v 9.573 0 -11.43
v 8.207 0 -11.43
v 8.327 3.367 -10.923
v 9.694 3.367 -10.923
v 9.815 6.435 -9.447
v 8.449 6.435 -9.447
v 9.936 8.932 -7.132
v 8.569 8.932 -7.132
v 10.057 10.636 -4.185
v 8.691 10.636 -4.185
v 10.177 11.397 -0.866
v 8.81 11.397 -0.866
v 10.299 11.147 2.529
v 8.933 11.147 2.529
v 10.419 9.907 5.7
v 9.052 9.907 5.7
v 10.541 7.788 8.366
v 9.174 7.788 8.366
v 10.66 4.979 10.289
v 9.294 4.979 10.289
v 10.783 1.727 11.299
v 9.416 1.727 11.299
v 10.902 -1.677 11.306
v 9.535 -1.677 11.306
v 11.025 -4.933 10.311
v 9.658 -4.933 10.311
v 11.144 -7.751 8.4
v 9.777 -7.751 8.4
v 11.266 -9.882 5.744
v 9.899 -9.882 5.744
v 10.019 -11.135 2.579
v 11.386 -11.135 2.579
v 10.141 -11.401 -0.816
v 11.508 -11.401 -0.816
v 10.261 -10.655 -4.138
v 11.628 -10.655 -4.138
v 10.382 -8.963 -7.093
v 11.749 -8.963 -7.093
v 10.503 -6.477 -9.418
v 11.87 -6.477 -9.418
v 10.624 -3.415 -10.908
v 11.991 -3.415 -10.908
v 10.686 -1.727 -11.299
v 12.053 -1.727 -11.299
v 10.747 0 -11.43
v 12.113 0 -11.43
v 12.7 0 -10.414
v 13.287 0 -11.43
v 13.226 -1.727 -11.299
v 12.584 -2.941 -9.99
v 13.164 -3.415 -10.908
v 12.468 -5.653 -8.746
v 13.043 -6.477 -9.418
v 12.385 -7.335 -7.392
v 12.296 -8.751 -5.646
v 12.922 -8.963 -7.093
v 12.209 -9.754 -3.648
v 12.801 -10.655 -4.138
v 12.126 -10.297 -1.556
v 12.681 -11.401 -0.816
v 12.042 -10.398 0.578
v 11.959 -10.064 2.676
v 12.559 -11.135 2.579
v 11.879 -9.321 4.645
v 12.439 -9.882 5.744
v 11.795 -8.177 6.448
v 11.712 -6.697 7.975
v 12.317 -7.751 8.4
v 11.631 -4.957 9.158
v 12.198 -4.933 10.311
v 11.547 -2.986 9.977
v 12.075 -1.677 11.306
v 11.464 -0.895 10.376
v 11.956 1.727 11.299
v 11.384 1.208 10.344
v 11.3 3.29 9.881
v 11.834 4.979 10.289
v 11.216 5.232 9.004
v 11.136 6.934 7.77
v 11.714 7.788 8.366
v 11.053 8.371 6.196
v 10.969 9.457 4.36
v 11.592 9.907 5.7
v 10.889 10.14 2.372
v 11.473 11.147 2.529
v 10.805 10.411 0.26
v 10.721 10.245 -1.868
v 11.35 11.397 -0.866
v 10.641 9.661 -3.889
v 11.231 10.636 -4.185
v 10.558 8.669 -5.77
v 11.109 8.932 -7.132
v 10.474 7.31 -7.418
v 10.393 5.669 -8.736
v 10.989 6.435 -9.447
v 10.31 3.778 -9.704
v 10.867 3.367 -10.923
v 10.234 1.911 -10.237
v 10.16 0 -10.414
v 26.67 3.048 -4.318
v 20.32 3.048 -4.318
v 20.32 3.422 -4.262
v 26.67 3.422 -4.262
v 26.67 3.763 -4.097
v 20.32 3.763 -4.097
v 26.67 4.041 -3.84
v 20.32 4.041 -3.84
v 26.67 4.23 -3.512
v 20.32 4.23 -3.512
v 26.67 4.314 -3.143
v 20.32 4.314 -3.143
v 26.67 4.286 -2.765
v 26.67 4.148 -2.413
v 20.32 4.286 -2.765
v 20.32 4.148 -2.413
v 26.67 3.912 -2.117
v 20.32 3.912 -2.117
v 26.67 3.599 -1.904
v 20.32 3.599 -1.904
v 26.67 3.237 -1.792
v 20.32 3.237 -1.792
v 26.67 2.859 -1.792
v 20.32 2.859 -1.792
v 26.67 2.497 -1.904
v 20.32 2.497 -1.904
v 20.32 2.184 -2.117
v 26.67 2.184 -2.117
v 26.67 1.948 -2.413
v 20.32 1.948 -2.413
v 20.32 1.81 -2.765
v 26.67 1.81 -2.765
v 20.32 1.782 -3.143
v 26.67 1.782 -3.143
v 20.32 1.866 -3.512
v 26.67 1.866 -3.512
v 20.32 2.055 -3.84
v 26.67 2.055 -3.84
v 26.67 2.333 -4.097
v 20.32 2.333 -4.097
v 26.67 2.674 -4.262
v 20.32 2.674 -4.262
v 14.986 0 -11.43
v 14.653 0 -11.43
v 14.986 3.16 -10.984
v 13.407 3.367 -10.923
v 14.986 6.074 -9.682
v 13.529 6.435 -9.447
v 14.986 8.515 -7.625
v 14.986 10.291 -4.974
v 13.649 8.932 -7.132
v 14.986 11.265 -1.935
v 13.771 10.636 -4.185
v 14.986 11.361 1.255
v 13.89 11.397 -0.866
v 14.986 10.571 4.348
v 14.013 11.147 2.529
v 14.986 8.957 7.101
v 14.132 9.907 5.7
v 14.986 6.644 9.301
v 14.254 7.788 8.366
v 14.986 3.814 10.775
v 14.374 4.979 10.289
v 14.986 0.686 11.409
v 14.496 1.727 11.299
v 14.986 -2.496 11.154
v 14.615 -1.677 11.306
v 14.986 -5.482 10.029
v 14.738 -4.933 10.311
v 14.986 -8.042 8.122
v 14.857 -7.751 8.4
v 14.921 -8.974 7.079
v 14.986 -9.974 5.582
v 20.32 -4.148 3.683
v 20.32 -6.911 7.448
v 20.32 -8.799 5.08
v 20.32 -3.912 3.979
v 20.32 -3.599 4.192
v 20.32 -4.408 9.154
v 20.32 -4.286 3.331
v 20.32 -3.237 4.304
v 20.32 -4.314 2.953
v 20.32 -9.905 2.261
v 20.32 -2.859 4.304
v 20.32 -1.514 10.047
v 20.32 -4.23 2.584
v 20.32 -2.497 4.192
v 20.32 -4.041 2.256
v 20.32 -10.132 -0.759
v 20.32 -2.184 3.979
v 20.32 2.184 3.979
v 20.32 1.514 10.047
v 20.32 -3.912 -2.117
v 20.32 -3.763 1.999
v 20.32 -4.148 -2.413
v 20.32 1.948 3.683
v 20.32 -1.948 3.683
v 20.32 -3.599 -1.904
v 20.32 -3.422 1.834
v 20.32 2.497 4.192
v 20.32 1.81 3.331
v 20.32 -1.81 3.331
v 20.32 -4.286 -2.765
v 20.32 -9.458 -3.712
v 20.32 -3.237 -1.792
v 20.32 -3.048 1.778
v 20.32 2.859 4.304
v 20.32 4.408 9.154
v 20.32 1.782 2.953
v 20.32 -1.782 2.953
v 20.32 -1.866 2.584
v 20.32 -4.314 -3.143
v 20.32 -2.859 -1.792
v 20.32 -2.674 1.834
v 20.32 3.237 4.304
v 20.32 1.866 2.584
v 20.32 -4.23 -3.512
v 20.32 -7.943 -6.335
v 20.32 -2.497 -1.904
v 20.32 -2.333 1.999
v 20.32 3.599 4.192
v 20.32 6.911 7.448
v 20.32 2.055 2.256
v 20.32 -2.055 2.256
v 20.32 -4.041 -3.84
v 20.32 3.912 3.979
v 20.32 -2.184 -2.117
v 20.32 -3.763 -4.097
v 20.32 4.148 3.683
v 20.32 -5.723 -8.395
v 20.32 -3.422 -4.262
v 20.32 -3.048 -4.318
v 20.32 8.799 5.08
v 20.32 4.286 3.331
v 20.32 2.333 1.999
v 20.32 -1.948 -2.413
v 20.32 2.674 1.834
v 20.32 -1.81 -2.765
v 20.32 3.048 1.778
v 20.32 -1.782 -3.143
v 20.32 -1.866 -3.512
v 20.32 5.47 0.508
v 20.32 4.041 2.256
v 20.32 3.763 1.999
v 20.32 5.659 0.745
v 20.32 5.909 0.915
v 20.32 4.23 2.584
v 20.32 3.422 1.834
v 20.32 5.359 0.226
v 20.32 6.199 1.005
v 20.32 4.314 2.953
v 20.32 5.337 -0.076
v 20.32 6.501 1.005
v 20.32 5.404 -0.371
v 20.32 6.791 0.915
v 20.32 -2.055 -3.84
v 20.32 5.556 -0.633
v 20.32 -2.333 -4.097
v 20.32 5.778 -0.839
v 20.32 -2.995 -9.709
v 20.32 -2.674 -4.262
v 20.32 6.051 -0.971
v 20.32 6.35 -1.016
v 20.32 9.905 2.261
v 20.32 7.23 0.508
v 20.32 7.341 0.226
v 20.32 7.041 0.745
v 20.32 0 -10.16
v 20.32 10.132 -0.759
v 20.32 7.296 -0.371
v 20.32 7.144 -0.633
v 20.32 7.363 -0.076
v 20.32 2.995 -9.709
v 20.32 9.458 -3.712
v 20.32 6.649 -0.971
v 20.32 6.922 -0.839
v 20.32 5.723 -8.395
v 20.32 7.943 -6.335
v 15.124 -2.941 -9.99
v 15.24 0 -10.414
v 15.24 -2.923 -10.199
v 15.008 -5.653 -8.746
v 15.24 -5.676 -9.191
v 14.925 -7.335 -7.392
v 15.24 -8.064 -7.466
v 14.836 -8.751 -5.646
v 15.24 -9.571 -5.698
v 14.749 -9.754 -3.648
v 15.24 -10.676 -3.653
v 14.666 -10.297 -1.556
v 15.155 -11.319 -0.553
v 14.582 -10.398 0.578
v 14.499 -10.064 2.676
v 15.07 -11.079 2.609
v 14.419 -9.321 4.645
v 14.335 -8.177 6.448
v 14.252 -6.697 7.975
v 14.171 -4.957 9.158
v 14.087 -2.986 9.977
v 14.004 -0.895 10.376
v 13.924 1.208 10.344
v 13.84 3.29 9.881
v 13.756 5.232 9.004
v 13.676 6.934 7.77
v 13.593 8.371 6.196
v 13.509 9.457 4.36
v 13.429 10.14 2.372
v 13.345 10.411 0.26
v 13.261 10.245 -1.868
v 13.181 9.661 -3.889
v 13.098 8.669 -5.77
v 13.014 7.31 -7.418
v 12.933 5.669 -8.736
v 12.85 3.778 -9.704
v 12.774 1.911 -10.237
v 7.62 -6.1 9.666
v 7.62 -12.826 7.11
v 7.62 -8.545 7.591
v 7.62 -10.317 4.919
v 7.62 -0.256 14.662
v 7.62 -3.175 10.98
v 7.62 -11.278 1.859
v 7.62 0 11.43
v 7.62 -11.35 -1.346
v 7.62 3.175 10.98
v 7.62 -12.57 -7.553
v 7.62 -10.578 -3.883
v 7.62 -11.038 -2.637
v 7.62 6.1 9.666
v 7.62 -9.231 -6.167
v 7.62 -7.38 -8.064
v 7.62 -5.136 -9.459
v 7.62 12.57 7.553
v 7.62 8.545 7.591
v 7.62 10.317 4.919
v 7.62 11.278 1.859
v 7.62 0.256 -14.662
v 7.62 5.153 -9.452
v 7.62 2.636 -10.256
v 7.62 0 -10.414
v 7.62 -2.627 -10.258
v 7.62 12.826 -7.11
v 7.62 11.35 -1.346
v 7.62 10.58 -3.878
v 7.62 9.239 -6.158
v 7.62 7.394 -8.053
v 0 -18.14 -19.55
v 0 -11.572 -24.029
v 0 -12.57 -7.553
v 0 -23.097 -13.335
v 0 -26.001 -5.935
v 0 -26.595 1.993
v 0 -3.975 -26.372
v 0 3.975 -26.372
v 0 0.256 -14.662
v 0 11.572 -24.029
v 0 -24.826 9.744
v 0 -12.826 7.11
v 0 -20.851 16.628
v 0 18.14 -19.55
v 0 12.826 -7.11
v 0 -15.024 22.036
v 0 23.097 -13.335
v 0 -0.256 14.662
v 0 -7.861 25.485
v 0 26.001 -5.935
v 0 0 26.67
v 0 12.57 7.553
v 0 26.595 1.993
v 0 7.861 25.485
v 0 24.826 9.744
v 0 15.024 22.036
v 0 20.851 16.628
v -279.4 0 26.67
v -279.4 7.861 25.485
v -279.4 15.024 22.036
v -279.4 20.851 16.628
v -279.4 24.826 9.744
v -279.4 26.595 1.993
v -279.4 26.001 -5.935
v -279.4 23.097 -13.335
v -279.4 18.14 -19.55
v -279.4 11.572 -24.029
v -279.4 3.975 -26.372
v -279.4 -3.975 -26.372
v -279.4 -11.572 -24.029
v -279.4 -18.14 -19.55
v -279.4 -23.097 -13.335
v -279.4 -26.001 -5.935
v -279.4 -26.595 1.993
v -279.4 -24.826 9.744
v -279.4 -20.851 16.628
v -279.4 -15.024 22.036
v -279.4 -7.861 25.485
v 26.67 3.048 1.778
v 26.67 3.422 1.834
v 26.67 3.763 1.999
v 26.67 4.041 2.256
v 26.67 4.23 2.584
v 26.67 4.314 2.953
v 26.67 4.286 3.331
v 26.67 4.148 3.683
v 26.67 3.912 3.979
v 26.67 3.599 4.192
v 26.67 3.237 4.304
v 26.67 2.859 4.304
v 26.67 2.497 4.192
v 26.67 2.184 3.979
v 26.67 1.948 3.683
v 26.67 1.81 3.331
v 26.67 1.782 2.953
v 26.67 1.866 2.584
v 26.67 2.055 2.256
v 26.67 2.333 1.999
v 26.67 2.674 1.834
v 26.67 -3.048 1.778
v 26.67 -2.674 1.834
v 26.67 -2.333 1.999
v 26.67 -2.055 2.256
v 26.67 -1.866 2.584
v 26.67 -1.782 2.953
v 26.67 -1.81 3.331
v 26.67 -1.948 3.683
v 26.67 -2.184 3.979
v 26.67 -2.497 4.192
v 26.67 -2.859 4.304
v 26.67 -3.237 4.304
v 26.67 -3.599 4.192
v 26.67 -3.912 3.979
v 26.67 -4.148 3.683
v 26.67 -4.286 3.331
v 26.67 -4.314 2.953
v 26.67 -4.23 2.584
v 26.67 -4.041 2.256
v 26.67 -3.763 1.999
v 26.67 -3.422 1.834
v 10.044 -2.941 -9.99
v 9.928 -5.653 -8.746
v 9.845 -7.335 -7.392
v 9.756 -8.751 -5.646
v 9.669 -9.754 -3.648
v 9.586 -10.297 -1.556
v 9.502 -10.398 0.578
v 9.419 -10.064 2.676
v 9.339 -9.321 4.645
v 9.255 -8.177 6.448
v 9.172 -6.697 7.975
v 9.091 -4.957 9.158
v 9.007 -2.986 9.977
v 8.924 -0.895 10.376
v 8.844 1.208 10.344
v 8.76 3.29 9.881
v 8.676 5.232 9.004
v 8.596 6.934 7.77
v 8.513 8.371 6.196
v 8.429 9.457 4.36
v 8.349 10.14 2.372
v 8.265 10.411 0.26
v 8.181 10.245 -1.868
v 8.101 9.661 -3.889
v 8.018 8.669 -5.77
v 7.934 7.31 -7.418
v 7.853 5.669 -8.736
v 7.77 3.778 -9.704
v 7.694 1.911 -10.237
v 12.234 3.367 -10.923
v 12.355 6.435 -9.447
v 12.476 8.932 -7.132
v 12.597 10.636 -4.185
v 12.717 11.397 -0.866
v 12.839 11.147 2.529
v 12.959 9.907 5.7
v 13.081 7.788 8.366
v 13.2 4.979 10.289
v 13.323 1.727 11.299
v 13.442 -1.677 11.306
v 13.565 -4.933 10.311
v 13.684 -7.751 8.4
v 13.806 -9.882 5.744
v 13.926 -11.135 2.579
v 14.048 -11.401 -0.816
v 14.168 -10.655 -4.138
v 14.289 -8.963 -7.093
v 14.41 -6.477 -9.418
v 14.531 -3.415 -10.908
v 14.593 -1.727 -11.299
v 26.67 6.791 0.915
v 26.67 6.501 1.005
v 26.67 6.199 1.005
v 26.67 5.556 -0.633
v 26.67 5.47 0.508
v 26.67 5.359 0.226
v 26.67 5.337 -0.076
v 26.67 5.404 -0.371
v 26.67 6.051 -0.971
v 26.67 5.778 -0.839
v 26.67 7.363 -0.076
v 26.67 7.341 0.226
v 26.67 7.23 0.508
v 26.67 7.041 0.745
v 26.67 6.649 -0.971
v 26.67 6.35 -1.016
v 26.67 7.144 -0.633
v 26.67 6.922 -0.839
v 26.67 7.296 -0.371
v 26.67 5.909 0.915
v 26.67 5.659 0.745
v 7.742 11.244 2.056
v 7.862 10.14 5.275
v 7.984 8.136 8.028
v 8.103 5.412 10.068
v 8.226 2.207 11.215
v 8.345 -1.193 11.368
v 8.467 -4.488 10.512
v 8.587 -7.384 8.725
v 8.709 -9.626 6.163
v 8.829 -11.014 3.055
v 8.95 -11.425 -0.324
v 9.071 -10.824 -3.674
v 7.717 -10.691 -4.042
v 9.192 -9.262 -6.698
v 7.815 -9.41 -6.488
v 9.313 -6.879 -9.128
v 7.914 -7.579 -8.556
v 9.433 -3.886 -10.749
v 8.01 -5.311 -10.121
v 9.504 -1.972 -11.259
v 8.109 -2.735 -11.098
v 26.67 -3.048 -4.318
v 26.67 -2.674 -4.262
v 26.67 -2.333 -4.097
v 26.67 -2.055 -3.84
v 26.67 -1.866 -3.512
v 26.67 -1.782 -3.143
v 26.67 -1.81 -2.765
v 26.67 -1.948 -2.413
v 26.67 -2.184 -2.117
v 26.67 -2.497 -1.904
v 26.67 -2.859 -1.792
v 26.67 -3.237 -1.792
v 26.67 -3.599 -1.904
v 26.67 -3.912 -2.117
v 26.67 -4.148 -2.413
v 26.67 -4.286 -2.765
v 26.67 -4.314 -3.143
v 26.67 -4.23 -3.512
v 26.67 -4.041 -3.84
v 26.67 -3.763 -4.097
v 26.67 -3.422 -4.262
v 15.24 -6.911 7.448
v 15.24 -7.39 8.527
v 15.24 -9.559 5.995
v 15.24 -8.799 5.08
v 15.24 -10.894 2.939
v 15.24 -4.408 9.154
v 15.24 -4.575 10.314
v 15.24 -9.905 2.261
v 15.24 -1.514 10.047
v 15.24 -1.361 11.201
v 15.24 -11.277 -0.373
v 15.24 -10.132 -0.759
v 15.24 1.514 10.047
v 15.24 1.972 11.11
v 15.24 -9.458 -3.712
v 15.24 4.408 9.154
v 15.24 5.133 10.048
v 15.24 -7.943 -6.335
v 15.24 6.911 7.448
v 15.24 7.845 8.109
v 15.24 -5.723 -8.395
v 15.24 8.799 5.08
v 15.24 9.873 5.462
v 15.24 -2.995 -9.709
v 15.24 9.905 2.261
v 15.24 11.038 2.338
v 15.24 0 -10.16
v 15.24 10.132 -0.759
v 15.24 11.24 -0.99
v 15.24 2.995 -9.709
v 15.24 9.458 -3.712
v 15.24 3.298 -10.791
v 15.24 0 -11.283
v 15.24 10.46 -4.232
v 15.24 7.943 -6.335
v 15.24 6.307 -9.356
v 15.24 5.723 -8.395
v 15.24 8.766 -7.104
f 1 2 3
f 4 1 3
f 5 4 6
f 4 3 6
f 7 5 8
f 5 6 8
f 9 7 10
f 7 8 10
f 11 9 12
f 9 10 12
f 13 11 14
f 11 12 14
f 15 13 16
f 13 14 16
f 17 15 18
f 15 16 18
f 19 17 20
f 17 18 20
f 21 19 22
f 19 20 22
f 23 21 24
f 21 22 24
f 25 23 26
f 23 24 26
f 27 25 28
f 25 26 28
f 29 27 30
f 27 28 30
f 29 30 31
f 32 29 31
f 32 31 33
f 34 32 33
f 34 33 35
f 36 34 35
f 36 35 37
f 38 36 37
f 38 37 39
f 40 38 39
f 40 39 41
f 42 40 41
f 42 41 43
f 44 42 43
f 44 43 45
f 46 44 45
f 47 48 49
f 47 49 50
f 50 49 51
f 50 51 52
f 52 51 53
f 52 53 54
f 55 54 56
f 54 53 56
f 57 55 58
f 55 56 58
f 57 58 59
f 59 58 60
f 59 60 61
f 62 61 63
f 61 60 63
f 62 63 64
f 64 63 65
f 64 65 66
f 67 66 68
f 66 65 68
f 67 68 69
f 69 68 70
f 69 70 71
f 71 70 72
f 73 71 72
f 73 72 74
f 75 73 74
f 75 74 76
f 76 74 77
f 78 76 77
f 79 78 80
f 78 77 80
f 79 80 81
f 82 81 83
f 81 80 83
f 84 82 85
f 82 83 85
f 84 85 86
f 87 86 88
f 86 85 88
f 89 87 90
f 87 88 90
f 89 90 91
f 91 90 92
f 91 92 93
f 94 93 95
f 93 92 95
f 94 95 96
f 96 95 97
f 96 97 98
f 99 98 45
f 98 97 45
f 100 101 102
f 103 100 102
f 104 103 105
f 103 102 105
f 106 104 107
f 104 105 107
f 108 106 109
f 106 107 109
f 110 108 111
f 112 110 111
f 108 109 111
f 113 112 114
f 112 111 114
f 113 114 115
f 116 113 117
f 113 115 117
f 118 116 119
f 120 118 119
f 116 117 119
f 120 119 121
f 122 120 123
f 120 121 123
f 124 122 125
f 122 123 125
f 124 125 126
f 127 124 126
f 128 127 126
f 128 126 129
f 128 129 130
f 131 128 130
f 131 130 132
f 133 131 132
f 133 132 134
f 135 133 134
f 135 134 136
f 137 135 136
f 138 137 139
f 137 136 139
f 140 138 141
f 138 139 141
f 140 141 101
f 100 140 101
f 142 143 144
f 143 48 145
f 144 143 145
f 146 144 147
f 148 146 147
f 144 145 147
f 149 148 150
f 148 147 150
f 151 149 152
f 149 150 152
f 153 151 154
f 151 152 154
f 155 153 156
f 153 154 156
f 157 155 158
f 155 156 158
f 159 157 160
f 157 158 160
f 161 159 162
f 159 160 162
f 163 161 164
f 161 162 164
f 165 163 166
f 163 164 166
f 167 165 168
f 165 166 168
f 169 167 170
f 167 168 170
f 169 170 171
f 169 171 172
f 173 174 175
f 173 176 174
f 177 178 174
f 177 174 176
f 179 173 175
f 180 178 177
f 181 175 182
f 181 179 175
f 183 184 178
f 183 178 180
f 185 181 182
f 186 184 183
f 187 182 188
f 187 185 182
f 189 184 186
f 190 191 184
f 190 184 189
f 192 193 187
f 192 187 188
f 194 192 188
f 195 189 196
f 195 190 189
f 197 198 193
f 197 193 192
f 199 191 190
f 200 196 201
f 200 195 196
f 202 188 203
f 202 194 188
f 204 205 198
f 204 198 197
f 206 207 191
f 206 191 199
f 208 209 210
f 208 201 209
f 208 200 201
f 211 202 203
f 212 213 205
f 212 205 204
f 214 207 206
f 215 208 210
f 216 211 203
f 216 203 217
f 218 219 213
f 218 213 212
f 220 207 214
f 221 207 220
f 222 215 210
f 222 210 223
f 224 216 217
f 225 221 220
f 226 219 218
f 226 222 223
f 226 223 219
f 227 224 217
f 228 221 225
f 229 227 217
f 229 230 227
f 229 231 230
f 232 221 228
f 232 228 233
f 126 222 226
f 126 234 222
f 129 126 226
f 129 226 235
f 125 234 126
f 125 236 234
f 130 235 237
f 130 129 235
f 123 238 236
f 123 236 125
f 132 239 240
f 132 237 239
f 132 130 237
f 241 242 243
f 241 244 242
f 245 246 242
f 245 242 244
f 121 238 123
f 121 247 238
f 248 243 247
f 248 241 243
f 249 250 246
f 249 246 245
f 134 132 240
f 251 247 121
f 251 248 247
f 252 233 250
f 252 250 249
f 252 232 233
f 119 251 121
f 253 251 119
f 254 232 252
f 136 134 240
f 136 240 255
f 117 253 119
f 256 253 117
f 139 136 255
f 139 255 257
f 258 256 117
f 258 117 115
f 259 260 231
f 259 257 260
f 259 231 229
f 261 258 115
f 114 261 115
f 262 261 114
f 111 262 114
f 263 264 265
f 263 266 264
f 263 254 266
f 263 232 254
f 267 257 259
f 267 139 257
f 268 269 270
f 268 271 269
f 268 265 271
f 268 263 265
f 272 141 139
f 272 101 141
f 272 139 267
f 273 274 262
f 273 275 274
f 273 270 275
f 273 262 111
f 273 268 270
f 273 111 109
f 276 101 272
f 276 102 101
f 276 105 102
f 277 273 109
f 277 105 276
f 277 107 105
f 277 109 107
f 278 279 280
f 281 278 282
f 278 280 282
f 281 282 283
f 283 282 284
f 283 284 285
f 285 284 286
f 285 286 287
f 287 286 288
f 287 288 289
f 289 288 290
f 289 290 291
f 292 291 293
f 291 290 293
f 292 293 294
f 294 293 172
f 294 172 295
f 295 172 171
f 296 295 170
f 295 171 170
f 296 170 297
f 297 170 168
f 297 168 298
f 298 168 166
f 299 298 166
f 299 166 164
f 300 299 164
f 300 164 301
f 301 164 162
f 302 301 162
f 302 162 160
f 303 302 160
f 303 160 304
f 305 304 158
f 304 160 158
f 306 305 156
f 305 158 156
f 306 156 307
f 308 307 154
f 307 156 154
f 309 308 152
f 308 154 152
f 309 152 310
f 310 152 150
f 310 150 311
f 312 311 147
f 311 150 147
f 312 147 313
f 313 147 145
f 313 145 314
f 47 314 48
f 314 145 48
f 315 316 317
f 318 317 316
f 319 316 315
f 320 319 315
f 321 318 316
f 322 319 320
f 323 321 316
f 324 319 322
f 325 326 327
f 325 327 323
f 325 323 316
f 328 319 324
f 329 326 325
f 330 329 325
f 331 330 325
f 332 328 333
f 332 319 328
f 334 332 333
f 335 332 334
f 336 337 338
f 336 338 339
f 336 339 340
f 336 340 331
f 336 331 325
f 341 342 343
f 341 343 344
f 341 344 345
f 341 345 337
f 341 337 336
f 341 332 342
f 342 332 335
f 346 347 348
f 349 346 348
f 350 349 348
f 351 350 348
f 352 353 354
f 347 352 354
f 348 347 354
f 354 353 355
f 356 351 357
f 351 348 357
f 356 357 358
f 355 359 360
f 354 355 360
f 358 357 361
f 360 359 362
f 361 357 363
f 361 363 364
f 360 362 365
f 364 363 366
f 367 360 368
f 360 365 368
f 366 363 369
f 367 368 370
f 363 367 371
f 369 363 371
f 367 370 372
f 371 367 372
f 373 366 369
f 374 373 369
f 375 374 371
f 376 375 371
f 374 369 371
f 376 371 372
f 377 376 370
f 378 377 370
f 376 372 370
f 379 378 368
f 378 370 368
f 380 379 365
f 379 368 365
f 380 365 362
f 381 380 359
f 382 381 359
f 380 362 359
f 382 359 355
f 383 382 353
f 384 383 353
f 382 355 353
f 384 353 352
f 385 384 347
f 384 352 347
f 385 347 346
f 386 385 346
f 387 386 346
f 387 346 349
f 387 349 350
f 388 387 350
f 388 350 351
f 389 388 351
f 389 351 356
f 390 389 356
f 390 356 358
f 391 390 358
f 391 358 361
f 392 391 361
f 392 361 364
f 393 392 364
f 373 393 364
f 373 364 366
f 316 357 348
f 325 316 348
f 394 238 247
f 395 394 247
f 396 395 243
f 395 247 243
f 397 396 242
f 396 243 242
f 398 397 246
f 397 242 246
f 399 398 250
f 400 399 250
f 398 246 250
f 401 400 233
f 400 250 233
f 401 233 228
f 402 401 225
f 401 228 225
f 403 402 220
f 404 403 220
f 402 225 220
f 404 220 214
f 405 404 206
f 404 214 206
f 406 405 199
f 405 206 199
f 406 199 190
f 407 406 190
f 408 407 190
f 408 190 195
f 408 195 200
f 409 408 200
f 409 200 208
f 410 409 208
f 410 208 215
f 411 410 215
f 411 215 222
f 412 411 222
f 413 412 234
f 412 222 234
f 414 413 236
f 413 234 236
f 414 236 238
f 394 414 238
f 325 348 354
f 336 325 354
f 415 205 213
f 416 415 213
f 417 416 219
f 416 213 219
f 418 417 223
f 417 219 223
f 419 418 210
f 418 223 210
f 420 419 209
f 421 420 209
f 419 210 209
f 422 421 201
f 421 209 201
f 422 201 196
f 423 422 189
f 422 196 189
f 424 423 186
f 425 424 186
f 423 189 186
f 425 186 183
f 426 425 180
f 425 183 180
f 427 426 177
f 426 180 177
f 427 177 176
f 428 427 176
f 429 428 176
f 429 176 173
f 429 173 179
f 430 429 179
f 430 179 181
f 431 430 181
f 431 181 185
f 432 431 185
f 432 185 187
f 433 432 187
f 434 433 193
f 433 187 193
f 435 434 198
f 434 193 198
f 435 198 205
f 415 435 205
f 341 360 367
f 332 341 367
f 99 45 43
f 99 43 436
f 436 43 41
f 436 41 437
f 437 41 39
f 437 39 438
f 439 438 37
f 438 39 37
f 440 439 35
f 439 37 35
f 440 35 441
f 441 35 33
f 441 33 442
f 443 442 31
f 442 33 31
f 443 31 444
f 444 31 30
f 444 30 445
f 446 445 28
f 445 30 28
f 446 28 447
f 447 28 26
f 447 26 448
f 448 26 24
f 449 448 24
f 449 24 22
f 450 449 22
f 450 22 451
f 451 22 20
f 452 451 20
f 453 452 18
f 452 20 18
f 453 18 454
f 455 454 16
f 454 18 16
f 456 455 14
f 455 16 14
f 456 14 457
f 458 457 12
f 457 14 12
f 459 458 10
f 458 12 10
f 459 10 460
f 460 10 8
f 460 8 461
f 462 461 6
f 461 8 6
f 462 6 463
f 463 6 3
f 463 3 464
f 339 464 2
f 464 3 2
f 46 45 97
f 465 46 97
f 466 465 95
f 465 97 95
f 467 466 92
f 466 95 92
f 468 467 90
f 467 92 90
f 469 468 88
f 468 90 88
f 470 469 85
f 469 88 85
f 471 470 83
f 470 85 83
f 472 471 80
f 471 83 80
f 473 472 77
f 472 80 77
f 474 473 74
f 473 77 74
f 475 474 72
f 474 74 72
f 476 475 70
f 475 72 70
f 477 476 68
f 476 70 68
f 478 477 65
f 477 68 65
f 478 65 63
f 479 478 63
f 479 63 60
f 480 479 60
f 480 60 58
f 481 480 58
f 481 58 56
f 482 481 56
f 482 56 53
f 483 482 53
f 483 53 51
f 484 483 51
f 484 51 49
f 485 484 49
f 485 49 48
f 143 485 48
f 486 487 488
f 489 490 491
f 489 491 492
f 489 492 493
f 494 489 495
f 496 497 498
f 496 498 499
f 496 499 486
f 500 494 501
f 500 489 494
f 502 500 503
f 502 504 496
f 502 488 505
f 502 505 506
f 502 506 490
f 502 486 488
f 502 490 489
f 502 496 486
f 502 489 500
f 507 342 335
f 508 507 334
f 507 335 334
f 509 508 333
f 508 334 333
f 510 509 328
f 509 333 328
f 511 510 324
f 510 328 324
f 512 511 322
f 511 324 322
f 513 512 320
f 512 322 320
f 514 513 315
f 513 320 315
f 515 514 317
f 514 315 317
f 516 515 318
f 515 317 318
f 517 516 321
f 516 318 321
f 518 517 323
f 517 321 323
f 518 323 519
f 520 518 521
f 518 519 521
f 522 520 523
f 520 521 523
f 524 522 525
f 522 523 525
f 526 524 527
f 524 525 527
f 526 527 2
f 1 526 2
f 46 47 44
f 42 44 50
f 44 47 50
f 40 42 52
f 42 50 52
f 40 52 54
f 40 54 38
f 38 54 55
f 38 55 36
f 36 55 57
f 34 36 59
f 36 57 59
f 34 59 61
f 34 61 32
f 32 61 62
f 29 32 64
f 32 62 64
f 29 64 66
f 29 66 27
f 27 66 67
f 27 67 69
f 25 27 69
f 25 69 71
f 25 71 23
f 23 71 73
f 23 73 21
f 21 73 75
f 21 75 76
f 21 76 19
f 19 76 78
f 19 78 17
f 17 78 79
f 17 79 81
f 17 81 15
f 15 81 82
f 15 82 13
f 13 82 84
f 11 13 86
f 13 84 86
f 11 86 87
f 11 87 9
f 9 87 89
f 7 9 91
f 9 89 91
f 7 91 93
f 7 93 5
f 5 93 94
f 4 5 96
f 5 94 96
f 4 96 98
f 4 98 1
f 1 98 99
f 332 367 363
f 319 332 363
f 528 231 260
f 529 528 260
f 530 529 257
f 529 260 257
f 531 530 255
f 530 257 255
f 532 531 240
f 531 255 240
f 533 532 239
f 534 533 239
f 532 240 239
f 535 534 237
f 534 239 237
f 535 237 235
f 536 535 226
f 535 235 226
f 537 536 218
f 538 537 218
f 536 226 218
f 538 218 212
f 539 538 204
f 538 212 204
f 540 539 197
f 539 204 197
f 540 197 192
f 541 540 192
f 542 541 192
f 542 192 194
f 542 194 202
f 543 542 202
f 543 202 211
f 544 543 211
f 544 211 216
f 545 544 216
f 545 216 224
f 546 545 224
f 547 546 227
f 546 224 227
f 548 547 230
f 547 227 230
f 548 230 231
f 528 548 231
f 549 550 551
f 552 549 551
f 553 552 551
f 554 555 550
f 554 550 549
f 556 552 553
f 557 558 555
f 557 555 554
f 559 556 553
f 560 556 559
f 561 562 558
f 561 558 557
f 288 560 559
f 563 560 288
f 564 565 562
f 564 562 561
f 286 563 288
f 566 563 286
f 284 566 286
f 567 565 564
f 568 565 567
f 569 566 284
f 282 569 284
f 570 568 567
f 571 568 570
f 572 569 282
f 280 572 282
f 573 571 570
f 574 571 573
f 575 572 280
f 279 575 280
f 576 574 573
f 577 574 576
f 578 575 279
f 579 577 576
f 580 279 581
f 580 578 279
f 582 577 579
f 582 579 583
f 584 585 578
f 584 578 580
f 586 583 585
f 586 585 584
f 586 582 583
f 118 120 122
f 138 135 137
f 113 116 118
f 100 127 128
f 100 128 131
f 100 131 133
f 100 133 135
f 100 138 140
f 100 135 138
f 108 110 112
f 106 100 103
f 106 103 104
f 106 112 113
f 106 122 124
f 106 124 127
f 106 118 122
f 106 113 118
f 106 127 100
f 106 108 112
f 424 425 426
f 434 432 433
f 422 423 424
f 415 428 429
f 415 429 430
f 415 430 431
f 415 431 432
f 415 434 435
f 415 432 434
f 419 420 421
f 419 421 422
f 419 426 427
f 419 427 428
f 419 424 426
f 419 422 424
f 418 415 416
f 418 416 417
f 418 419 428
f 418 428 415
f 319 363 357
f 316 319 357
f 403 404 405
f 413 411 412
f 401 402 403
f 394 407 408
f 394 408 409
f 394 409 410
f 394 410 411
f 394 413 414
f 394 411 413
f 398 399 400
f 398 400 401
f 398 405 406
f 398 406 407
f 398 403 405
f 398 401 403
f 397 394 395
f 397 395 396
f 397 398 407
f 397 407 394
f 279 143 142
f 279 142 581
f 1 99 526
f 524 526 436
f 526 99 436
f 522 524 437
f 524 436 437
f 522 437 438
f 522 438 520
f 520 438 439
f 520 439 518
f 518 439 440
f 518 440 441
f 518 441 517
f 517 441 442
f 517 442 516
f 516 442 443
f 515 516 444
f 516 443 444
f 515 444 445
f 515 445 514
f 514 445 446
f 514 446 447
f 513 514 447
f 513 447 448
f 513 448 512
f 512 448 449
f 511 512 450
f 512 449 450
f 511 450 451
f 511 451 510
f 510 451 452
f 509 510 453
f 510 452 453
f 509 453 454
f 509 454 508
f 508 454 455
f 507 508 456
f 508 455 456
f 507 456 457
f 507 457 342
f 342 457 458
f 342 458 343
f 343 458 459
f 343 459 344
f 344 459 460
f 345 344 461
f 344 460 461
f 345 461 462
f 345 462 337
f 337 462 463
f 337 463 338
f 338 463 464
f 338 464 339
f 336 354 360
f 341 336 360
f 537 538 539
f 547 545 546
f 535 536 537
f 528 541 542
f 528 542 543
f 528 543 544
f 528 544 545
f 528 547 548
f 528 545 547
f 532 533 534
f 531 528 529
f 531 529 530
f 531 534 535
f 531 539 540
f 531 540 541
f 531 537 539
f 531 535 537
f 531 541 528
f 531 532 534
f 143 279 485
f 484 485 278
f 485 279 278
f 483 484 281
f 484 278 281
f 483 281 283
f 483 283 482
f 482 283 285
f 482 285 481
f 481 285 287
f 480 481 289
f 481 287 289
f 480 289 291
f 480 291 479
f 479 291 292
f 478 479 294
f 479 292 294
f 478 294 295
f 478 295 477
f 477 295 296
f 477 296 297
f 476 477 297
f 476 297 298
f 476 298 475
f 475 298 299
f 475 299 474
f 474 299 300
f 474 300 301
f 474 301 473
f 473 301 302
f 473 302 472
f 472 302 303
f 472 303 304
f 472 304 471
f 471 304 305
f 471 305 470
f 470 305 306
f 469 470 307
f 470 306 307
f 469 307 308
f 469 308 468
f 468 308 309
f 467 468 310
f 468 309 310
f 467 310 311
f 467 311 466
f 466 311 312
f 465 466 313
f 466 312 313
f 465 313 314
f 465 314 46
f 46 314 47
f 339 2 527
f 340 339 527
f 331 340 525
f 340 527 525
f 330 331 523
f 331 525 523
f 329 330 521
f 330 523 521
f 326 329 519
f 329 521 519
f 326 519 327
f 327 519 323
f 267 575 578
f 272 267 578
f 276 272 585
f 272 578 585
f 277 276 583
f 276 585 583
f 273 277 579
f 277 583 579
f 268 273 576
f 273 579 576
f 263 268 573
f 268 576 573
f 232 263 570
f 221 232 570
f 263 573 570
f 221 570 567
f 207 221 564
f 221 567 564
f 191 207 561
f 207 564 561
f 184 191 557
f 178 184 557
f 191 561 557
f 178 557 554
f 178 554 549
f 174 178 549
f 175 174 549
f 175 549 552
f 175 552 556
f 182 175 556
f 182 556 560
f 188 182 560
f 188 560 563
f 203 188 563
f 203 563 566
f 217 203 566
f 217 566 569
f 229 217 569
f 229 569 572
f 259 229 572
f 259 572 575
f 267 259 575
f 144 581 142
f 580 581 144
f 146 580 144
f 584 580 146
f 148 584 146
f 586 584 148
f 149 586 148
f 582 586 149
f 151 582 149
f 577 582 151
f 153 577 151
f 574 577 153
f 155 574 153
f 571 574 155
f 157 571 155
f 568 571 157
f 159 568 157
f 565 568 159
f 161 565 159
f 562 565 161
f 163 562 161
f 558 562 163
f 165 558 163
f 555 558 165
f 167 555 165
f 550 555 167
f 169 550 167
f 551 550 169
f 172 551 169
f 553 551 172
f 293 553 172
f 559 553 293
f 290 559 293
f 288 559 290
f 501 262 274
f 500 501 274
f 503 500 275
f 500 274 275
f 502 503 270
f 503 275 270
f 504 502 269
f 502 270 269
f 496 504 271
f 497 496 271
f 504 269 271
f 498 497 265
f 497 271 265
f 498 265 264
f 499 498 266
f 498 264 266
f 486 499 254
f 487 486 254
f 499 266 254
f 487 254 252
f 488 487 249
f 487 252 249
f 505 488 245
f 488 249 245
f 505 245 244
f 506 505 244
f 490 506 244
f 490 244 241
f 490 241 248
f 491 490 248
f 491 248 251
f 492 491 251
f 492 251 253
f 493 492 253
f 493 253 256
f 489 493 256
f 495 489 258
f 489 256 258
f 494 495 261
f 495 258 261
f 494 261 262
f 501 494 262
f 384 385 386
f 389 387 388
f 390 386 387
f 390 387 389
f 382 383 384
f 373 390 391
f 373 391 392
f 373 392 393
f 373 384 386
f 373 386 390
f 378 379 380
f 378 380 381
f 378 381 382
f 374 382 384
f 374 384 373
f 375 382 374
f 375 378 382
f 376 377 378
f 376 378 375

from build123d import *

# Parameters (mm, degrees)
BOSS_EXTRUDE1_DEPTH = 7.62
SKETCH4_R           = 10.16
BOSS_EXTRUDE2_DEPTH = 12.7
SKETCH5_R           = 11.43
SKETCH5_R_2         = 10.16
EXTRUDE_THIN1_DEPTH = 7.62
CHAMFER2_SIZE       = 0.254
CHAMFER2_SIZE2      = 0.146646968
CUT_SWEEP4_PITCH    = 2.54
CUT_SWEEP4_TO       = 7.62
SKETCH10_R          = 26.67
BOSS_EXTRUDE3_DEPTH = 279.4
SKETCH11_R          = 1.27
BOSS_EXTRUDE4_DEPTH = 6.35
SKETCH12_R          = 1.27
BOSS_EXTRUDE5_DEPTH = 6.35
SKETCH13_R          = 1.27
BOSS_EXTRUDE6_DEPTH = 6.35
SKETCH14_R          = 1.27
BOSS_EXTRUDE7_DEPTH = 6.35
SKETCH16_R          = 1.016
BOSS_EXTRUDE8_DEPTH = 6.35
SKETCH17_R          = 26.67
BOSS_EXTRUDE9_DEPTH = 127


with BuildPart() as part:
    # Sketch3 → Boss-Extrude1 (new body)
    with BuildSketch(Plane(origin=(0, 0, 0), x_dir=(0, 0, -1), z_dir=(1, 0, 0))):
        Polygon((14.662463333, 0.255934249), (7.109586105, 12.826032853), (-7.552877228, 12.570098604), (-14.662463333, -0.255934249), (-7.109586105, -12.826032853), (7.552877228, -12.570098604), align=None)
    extrude(amount=BOSS_EXTRUDE1_DEPTH)

    # Sketch4 → Boss-Extrude2 (add)
    with BuildSketch(Plane(origin=(7.62, 0, 0), x_dir=(0, 0, -1), z_dir=(1, 0, 0))):
        Circle(SKETCH4_R)
    extrude(amount=BOSS_EXTRUDE2_DEPTH)

    # Sketch5 → Extrude-Thin1 (add)
    with BuildSketch(Plane(origin=(7.62, 0, 0), x_dir=(0, 0, -1), z_dir=(1, 0, 0))):
        Circle(SKETCH5_R)
        Circle(SKETCH5_R_2, mode=Mode.SUBTRACT)
    extrude(amount=EXTRUDE_THIN1_DEPTH)

    # Chamfer2
    chamfer2_edges = [part.edges().sort_by_distance(p)[0] for p in [
        (15.24, 0, 11.43),
    ]]
    chamfer2_side = [part.faces().sort_by_distance(p)[0] for p in [
        (11.43, 0, 11.43),
    ]]
    chamfer(chamfer2_edges, length=CHAMFER2_SIZE, length2=CHAMFER2_SIZE2, reference=chamfer2_side[0])

    # Cut-Sweep4: arcs per turn and ends read off the stored shape
    # Cut-Sweep4: the profile of Sketch9 screwed along a right-hand helix through 3.6 turns, 10 arcs to a turn; built about Z, then put on its axis
    cut_sweep4_z = Axis((0, 0, 0), (0, 0, 1))
    cut_sweep4_corners = [(10.414, 0, 0), (11.938, 0, -0.87988181), (11.938, 0, 0.87988181)]
    with BuildLine(mode=Mode.PRIVATE) as cut_sweep4_profile:
        Line(cut_sweep4_corners[0], cut_sweep4_corners[1])
        Line(cut_sweep4_corners[1], cut_sweep4_corners[2])
        Line(cut_sweep4_corners[2], cut_sweep4_corners[0])
    cut_sweep4_cap = Face(cut_sweep4_profile.wire())
    cut_sweep4_turn_angles = [0, 18, 36, 54, 72, 90, 108, 126, 144, 162, 180, 198, 216, 234, 252, 270, 288, 306, 324, 342, 360]
    cut_sweep4_turn_weights = [1, 0.9510565162951535, 1, 0.9510565162951535, 1, 0.9510565162951535, 1, 0.9510565162951535, 1, 0.9510565162951535, 1, 0.9510565162951535, 1, 0.9510565162951535, 1, 0.9510565162951535, 1, 0.9510565162951535, 1, 0.9510565162951535, 1]
    cut_sweep4_turn_rails = [Edge.make_bspline([Vector(p[0], p[1], 0).rotate(cut_sweep4_z, cut_sweep4_turn_angles[k]) / cut_sweep4_turn_weights[k] + Vector(0, 0, p[2] + CUT_SWEEP4_PITCH * cut_sweep4_turn_angles[k] / 360) for k in range(21)], [0, 0, 0, 1, 1, 2, 2, 3, 3, 4, 4, 5, 5, 6, 6, 7, 7, 8, 8, 9, 9, 10, 10, 10], 2, cut_sweep4_turn_weights) for p in cut_sweep4_corners]
    cut_sweep4_turn_sides = [Face.make_surface_from_curves(cut_sweep4_turn_rails[p[0]], cut_sweep4_turn_rails[p[1]]) for p in [(0, 1), (1, 2), (2, 0)]]
    cut_sweep4_last_angles = [1080, 1098, 1116, 1134, 1152, 1170, 1188, 1206, 1224, 1242, 1260, 1278, 1296]
    cut_sweep4_last_weights = [1, 0.9510565162951535, 1, 0.9510565162951535, 1, 0.9510565162951535, 1, 0.9510565162951535, 1, 0.9510565162951535, 1, 0.9510565162951535, 1]
    cut_sweep4_last_rails = [Edge.make_bspline([Vector(p[0], p[1], 0).rotate(cut_sweep4_z, cut_sweep4_last_angles[k]) / cut_sweep4_last_weights[k] + Vector(0, 0, p[2] + CUT_SWEEP4_PITCH * cut_sweep4_last_angles[k] / 360) for k in range(13)], [0, 0, 0, 1, 1, 2, 2, 3, 3, 4, 4, 5, 5, 6, 6, 6], 2, cut_sweep4_last_weights) for p in cut_sweep4_corners]
    cut_sweep4_last_sides = [Face.make_surface_from_curves(cut_sweep4_last_rails[p[0]], cut_sweep4_last_rails[p[1]]) for p in [(0, 1), (1, 2), (2, 0)]]
    cut_sweep4 = Plane(origin=(15.24, 0, 0), x_dir=(0, 0, -1), z_dir=(-1, 0, 0)) * split(Solid(Shell([*[p.moved(Location((0, 0, CUT_SWEEP4_PITCH * i))) for i in range(3) for p in cut_sweep4_turn_sides], *cut_sweep4_last_sides, cut_sweep4_cap, cut_sweep4_cap.rotate(cut_sweep4_z, 1296).moved(Location((0, 0, CUT_SWEEP4_PITCH * 1296 / 360)))])), bisect_by=Plane.XY.offset(CUT_SWEEP4_TO), keep=Keep.BOTTOM, mode=Mode.PRIVATE)
    add(cut_sweep4, mode=Mode.SUBTRACT)

    # Sketch10 → Boss-Extrude3 (add)
    with BuildSketch(Plane.ZY):
        Circle(SKETCH10_R)
    extrude(amount=BOSS_EXTRUDE3_DEPTH)

    # Sketch11 → Boss-Extrude4 (add)
    with BuildSketch(Plane(origin=(20.32, 0, 0), x_dir=(0, 0, -1), z_dir=(1, 0, 0))):
        with Locations((-3.048, 3.048)):
            Circle(SKETCH11_R)
    extrude(amount=BOSS_EXTRUDE4_DEPTH)

    # Sketch12 → Boss-Extrude5 (add)
    with BuildSketch(Plane(origin=(20.32, 0, 0), x_dir=(0, 0, -1), z_dir=(1, 0, 0))):
        with Locations((3.048, 3.048)):
            Circle(SKETCH12_R)
    extrude(amount=BOSS_EXTRUDE5_DEPTH)

    # Sketch13 → Boss-Extrude6 (add)
    with BuildSketch(Plane(origin=(20.32, 0, 0), x_dir=(0, 0, -1), z_dir=(1, 0, 0))):
        with Locations((3.048, -3.048)):
            Circle(SKETCH13_R)
    extrude(amount=BOSS_EXTRUDE6_DEPTH)

    # Sketch14 → Boss-Extrude7 (add)
    with BuildSketch(Plane(origin=(20.32, 0, 0), x_dir=(0, 0, -1), z_dir=(1, 0, 0))):
        with Locations((-3.048, -3.048)):
            Circle(SKETCH14_R)
    extrude(amount=BOSS_EXTRUDE7_DEPTH)

    # Sketch16 → Boss-Extrude8 (add)
    with BuildSketch(Plane(origin=(20.32, 0, 0), x_dir=(0, 0, -1), z_dir=(1, 0, 0))):
        with Locations((0, 6.35)):
            Circle(SKETCH16_R)
    extrude(amount=BOSS_EXTRUDE8_DEPTH)

    # Sketch17 → Boss-Extrude9 (add)
    with BuildSketch(Plane(origin=(0, 0, 0), x_dir=(0, 0, -1), z_dir=(1, 0, 0))):
        with Locations(Location((0, 0, 0), (0, 0, 180))):
            Circle(SKETCH17_R)
    extrude(amount=-BOSS_EXTRUDE9_DEPTH)


solid = part.part
